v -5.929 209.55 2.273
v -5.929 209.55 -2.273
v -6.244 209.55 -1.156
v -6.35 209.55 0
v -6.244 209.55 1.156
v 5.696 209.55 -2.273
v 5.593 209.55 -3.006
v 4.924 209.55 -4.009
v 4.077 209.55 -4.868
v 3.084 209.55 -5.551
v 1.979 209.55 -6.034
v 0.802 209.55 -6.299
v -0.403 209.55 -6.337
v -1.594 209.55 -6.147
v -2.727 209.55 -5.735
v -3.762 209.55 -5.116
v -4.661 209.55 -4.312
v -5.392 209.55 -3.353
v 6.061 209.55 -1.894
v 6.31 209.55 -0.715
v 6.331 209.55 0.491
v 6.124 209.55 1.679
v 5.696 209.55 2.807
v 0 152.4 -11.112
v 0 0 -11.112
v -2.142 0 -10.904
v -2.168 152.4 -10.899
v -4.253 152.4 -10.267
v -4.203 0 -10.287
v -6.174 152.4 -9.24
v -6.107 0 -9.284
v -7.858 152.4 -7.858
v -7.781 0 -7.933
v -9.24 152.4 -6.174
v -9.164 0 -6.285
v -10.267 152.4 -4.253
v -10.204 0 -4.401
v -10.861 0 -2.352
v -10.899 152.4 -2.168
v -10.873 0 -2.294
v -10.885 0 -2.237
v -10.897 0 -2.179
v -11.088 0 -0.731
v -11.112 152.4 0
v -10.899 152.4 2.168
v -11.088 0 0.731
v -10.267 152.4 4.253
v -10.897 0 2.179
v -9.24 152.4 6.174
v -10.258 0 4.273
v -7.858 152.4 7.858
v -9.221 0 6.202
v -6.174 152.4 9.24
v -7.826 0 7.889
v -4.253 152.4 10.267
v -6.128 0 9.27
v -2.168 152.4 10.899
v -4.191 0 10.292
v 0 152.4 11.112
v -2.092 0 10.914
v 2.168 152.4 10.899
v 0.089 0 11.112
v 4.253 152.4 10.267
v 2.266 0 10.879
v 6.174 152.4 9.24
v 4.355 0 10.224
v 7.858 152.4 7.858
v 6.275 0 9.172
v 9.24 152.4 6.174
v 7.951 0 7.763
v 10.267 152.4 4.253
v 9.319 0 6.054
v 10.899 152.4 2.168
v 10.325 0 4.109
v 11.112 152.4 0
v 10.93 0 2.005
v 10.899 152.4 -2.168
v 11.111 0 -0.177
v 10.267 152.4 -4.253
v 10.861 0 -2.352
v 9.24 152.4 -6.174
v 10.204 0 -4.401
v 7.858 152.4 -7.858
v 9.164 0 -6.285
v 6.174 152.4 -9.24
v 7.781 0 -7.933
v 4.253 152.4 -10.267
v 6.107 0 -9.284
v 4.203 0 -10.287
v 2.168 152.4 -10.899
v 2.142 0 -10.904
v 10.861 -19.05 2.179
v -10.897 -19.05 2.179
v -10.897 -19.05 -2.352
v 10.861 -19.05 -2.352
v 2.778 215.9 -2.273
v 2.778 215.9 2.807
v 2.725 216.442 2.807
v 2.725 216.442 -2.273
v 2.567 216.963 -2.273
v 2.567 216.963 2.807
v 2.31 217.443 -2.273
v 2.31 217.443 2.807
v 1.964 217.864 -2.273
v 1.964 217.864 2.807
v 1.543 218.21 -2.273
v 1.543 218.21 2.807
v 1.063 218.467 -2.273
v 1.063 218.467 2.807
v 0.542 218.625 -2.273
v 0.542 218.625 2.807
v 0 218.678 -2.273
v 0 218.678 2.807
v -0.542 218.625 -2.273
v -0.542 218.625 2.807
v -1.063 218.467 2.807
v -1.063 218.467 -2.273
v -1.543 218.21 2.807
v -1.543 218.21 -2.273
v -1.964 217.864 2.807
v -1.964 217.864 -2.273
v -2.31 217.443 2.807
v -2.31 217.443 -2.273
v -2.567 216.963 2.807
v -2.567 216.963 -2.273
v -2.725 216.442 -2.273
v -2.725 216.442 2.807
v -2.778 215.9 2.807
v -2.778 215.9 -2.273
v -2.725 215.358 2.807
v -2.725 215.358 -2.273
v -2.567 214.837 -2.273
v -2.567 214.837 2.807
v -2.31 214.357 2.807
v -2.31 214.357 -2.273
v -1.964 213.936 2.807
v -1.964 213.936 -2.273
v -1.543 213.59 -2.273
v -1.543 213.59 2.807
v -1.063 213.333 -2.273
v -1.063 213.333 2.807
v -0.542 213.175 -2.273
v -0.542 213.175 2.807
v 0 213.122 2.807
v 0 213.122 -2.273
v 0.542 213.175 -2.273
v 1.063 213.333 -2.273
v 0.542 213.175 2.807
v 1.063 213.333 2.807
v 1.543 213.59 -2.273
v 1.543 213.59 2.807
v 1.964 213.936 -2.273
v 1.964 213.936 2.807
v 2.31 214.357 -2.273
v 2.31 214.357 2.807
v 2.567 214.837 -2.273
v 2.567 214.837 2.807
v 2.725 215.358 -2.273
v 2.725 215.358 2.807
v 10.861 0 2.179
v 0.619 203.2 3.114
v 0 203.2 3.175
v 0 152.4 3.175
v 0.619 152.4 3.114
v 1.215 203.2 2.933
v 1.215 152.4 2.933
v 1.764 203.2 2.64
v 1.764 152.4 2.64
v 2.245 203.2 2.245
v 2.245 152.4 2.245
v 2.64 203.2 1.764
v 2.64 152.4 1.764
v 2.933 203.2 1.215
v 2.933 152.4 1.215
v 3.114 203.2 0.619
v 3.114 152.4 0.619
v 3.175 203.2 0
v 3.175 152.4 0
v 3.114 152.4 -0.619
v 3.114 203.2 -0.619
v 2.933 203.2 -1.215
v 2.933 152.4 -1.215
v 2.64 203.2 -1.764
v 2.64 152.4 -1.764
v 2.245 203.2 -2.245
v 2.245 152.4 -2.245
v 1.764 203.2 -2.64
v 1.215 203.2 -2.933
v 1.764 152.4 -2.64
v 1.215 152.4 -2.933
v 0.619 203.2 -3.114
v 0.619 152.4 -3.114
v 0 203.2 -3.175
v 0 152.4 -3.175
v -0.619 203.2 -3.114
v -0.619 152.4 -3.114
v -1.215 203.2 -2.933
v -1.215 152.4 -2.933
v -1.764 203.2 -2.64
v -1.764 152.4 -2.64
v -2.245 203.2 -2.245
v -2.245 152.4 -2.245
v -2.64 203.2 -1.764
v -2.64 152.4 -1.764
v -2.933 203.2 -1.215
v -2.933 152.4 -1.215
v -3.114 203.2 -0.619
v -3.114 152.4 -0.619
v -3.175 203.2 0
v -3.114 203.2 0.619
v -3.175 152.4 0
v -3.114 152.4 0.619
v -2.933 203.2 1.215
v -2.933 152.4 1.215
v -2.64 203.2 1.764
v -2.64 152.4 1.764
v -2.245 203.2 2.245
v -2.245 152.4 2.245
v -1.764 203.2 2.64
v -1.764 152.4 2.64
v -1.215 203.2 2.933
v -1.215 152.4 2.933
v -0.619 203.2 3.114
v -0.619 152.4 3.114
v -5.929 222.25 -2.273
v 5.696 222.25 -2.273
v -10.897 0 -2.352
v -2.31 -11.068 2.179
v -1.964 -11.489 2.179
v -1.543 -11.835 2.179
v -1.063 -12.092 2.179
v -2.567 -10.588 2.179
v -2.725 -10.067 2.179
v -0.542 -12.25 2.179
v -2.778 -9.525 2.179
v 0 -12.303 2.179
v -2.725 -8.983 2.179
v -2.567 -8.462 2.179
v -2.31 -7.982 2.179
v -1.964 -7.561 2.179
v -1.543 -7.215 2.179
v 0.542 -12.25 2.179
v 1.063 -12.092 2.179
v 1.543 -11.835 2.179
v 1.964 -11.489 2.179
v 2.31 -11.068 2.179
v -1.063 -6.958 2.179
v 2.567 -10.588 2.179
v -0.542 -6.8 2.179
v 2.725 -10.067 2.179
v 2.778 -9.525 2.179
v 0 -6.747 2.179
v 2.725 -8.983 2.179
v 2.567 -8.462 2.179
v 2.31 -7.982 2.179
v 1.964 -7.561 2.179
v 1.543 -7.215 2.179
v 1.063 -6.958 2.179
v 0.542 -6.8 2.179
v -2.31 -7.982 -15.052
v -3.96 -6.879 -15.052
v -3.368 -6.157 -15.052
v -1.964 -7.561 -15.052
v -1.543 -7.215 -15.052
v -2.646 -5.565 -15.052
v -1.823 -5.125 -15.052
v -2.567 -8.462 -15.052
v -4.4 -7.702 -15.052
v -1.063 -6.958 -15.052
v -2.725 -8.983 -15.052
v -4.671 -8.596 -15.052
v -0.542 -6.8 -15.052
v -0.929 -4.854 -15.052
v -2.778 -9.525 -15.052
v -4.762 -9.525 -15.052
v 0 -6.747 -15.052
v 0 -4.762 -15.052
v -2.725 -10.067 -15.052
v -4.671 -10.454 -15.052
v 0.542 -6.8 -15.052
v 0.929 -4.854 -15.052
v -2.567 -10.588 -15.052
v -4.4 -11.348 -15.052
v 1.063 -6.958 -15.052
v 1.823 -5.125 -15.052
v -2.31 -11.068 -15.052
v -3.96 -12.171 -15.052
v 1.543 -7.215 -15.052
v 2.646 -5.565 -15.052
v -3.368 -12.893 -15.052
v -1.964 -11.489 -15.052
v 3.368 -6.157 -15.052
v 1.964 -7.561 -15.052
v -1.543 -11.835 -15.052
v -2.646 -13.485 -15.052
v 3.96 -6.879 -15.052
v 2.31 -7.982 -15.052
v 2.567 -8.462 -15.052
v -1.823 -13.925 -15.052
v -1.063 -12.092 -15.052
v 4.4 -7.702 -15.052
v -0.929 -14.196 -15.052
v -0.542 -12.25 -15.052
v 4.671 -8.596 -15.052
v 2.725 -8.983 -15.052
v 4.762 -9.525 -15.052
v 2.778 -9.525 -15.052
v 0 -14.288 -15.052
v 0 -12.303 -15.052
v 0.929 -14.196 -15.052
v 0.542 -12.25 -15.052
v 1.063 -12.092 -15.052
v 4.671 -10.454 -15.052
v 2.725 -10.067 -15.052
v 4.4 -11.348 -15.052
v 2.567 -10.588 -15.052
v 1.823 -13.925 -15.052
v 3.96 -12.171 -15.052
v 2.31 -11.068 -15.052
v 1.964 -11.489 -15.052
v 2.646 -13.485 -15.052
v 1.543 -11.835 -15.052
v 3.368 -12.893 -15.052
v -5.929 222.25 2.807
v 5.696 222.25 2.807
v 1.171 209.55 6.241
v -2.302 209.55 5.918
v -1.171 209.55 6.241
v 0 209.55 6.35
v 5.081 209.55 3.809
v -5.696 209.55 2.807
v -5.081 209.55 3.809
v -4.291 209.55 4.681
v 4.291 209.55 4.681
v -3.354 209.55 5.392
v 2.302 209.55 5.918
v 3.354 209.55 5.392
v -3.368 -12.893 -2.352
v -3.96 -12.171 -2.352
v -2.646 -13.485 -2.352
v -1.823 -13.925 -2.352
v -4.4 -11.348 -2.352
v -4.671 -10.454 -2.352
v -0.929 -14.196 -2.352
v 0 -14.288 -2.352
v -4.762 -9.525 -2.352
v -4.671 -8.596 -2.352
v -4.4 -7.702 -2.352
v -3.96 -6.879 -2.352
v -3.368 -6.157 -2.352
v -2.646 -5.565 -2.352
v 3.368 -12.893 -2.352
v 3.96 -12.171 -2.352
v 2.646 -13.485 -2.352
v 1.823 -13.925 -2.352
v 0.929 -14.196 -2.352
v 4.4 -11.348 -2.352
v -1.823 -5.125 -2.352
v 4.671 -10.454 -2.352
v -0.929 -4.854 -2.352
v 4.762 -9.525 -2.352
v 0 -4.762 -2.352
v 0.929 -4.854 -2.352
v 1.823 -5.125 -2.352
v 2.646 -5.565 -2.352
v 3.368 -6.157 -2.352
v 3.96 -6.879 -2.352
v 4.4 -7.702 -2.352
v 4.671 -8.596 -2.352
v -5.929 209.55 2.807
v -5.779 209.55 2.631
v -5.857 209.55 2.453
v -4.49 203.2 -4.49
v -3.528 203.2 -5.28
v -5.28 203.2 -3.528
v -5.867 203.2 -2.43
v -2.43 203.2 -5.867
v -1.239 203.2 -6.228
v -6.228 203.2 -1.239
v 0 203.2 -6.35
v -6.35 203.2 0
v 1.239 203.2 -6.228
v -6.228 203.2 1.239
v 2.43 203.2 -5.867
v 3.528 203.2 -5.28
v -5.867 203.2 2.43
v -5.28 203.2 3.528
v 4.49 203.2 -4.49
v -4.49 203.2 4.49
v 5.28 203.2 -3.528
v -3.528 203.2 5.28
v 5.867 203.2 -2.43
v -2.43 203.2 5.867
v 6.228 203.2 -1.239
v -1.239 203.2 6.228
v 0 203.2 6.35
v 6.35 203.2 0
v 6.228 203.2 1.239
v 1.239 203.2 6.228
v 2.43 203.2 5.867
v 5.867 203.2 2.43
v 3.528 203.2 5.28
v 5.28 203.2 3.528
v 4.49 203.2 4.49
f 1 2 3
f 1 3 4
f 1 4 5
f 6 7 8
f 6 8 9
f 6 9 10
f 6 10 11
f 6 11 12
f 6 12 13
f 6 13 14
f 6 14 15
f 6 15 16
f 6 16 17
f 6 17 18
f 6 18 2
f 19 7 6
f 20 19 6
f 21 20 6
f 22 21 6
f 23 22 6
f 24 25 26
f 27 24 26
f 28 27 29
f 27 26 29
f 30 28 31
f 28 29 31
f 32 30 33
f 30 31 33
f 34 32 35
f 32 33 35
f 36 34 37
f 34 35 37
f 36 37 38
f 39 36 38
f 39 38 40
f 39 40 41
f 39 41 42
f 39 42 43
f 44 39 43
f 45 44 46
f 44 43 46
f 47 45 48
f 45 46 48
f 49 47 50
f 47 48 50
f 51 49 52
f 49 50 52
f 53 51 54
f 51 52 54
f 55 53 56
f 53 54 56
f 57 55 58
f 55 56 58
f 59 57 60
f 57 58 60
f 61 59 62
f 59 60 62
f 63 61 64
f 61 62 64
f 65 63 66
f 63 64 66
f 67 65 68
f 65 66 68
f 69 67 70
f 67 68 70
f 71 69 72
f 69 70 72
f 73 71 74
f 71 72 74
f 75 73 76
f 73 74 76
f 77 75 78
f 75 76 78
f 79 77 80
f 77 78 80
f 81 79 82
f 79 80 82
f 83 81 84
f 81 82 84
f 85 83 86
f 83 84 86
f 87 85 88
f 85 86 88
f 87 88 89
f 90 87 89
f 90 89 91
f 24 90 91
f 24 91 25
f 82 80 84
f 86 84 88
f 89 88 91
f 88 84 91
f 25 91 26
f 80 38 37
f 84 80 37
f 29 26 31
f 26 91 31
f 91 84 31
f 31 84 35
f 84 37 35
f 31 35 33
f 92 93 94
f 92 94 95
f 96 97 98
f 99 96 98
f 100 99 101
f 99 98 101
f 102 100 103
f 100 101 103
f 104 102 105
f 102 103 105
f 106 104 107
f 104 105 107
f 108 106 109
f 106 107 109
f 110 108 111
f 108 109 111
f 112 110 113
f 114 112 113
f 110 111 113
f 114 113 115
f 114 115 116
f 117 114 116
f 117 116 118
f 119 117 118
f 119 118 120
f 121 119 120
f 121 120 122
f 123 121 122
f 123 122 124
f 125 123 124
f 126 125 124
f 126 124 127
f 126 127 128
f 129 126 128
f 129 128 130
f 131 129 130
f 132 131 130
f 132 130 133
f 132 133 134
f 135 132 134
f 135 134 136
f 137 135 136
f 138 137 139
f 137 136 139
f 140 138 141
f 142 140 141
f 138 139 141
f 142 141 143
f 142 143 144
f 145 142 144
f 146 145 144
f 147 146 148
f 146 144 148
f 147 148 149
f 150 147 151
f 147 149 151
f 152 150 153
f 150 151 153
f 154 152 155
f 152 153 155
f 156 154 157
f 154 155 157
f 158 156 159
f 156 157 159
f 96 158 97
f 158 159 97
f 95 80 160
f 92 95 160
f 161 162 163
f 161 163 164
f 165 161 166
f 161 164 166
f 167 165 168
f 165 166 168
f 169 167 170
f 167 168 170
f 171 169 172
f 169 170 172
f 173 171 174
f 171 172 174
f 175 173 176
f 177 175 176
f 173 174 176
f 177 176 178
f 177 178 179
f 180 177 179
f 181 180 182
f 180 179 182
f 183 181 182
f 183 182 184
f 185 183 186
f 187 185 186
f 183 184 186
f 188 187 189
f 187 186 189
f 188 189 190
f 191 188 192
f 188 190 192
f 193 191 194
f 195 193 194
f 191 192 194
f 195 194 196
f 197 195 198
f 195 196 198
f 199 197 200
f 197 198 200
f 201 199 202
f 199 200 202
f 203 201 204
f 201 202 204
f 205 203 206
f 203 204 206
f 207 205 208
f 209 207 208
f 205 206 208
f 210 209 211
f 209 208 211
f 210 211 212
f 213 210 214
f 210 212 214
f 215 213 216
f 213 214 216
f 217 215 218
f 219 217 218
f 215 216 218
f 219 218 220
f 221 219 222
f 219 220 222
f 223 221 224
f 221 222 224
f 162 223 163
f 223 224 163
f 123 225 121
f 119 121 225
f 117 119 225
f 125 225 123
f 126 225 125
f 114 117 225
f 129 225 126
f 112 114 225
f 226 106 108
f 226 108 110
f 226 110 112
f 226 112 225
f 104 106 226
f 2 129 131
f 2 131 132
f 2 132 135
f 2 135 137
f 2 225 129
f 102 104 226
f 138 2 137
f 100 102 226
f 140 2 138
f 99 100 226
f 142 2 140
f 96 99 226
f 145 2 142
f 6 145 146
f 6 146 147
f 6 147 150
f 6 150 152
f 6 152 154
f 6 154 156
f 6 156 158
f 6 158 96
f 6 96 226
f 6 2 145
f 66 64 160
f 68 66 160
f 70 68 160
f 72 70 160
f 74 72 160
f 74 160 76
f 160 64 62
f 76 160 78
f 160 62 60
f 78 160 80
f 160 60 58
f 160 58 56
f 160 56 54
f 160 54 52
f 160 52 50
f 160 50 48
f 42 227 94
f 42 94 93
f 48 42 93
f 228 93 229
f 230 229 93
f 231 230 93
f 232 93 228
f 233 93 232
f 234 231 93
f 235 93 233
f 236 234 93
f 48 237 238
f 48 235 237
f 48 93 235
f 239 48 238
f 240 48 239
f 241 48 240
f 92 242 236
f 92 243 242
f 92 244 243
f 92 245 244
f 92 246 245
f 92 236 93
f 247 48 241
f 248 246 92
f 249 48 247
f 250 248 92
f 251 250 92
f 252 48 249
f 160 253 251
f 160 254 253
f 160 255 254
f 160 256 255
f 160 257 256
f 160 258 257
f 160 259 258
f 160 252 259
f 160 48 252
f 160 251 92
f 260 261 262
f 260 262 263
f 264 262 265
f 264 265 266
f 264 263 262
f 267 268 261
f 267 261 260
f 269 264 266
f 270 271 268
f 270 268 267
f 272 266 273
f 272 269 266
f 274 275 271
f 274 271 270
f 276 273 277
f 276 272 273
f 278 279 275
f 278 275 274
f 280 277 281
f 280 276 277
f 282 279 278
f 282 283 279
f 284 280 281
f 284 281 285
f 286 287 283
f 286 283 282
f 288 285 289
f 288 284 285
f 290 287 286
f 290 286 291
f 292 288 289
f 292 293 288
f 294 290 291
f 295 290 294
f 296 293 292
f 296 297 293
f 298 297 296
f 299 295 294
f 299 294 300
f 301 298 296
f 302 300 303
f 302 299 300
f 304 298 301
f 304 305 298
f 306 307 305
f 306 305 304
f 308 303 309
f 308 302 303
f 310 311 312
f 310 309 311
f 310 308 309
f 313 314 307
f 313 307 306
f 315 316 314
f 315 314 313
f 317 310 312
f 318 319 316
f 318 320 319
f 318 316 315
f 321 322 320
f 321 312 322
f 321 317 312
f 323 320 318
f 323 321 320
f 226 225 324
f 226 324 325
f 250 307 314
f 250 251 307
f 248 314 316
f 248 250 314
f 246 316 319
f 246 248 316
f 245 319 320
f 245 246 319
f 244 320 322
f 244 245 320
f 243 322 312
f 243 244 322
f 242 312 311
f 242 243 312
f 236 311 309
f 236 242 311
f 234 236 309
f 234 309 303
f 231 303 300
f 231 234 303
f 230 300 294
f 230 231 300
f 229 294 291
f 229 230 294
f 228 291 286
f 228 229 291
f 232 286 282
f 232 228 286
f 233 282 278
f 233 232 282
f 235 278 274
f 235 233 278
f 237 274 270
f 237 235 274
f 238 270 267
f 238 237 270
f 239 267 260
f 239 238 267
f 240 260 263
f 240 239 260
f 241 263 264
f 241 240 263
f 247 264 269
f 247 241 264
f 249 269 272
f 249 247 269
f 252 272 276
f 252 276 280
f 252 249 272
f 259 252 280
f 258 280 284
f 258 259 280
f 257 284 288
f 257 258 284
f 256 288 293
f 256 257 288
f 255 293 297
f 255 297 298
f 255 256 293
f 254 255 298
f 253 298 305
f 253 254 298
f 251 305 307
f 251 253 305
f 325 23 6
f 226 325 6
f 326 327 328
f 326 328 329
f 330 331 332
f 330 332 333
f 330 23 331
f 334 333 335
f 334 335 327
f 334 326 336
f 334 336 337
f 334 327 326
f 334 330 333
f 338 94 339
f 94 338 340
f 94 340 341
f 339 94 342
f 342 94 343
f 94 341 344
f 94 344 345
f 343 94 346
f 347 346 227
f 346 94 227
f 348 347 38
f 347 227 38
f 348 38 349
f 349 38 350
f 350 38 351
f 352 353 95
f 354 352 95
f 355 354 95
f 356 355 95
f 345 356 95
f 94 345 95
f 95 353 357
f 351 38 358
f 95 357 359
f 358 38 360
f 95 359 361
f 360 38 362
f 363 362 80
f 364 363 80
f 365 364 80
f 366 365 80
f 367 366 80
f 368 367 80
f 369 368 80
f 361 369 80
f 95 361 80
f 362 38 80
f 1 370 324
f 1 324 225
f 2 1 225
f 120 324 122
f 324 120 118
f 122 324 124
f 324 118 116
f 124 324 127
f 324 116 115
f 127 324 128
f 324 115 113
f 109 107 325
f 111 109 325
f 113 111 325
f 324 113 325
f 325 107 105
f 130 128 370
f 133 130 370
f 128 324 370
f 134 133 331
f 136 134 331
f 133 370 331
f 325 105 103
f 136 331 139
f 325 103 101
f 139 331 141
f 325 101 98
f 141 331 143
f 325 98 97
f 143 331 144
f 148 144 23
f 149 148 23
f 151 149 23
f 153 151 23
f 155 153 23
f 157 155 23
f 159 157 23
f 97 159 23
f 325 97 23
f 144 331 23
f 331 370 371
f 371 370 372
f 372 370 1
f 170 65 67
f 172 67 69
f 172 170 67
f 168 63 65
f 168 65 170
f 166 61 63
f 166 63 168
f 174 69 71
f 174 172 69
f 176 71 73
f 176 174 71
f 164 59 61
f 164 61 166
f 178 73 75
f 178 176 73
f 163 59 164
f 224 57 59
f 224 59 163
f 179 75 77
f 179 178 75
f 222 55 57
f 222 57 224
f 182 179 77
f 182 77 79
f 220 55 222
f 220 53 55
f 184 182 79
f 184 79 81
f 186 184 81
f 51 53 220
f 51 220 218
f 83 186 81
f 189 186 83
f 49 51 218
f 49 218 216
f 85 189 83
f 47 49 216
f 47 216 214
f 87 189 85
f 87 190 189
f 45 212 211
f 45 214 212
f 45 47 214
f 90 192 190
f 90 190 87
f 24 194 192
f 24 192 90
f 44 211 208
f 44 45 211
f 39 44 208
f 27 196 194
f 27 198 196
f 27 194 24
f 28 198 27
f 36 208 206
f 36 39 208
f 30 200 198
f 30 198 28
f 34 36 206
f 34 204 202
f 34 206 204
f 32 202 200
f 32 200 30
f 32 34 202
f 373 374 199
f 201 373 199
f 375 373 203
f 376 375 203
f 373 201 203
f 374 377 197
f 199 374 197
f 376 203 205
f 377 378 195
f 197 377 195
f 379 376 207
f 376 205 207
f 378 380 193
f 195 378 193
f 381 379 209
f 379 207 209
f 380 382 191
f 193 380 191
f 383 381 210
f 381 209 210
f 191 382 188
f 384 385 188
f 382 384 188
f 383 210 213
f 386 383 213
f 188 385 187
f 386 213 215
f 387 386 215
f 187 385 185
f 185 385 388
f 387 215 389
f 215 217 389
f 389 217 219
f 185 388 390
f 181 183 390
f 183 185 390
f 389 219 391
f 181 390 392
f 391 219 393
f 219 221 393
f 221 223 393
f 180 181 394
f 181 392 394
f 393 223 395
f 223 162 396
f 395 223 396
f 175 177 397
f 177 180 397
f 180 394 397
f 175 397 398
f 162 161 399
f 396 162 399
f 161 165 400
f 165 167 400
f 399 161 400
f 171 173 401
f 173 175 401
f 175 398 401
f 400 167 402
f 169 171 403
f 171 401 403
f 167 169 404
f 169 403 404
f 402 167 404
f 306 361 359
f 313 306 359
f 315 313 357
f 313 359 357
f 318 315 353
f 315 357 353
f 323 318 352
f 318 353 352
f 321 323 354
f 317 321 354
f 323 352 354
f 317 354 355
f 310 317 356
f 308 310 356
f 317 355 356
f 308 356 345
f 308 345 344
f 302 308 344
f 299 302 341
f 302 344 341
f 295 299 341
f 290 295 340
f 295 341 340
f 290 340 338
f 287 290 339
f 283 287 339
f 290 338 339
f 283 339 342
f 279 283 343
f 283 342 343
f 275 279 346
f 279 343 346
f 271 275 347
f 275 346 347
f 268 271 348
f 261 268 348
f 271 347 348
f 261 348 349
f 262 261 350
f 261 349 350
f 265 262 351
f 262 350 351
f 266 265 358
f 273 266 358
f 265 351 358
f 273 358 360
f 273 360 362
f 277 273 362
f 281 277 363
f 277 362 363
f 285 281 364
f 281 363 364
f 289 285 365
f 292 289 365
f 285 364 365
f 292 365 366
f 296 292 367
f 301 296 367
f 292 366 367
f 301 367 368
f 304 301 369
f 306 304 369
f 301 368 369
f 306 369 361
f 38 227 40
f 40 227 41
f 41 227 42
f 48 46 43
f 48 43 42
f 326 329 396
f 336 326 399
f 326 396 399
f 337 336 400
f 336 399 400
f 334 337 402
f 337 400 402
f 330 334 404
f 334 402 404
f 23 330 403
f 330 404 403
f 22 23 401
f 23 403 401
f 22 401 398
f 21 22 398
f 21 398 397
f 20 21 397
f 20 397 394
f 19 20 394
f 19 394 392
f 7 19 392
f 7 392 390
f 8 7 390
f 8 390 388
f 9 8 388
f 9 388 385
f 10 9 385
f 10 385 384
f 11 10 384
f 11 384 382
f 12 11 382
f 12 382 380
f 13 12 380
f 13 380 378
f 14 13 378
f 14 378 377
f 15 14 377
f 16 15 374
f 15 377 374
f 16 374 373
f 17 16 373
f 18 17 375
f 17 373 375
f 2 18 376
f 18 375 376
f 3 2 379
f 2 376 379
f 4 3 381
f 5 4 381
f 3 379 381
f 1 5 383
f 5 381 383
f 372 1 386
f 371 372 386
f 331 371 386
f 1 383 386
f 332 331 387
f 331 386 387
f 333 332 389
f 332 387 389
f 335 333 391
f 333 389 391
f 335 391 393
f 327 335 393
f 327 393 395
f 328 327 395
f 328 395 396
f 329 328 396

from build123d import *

# Parameters (mm, degrees)
SKETCH1_R           = 11.1125
BOSS_EXTRUDE1_DEPTH = 152.4
SKETCH2_R           = 3.175
BOSS_EXTRUDE2_DEPTH = 50.8
SKETCH3_W           = 21.757515496
SKETCH3_H           = 4.530998995
BOSS_EXTRUDE3_DEPTH = 19.05
SKETCH4_R           = 2.778125
CUT_EXTRUDE1_DEPTH  = 19.05
SKETCH5_R           = 4.7625
SKETCH5_R_2         = 2.778125
BOSS_EXTRUDE4_DEPTH = 12.7
SKETCH6_R           = 6.35
BOSS_EXTRUDE5_DEPTH = 6.35
SKETCH7_W           = 11.625186508
SKETCH7_H           = 5.08
BOSS_EXTRUDE6_DEPTH = 12.7
SKETCH8_R           = 2.778125
CUT_EXTRUDE2_DEPTH  = 12.7


with BuildPart() as part:
    # Sketch1 → Boss-Extrude1 (new body)
    with BuildSketch(Plane(origin=(0, 0, 0), x_dir=(1, 0, 0), z_dir=(0, 1, 0))):
        with Locations(Location((0, 0, 0), (0, 0, 90))):
            Circle(SKETCH1_R)
    extrude(amount=BOSS_EXTRUDE1_DEPTH)

    # Sketch2 → Boss-Extrude2 (add)
    with BuildSketch(Plane(origin=(0, 152.4, 0), x_dir=(1, 0, 0), z_dir=(0, 1, 0))):
        with Locations(Location((0, 0, 0), (0, 0, 270))):
            Circle(SKETCH2_R)
    extrude(amount=BOSS_EXTRUDE2_DEPTH)

    # Sketch3 → Boss-Extrude3 (add)
    with BuildSketch(Plane.XZ):
        with Locations((-0.018003691, -0.086452367)):
            Rectangle(SKETCH3_W, SKETCH3_H)
    extrude(amount=BOSS_EXTRUDE3_DEPTH)

    # Sketch4 → Cut-Extrude1 (cut)
    with BuildSketch(Plane.XY.offset(2.179047131)):
        with Locations((0, -9.525)):
            Circle(SKETCH4_R)
    extrude(amount=-CUT_EXTRUDE1_DEPTH, mode=Mode.SUBTRACT)

    # Sketch5 → Boss-Extrude4 (add)
    with BuildSketch(Plane(origin=(0, 0, -2.351951864), x_dir=(-1, 0, 0), z_dir=(0, 0, -1))):
        with Locations(Location((0, -9.525, 0), (0, 0, 180))):
            Circle(SKETCH5_R)
        with Locations(Location((0, -9.525, 0), (0, 0, 180))):
            Circle(SKETCH5_R_2, mode=Mode.SUBTRACT)
    extrude(amount=BOSS_EXTRUDE4_DEPTH)

    # Sketch6 → Boss-Extrude5 (add)
    with BuildSketch(Plane(origin=(0, 203.2, 0), x_dir=(1, 0, 0), z_dir=(0, 1, 0))):
        with Locations(Location((0, 0, 0), (0, 0, 270))):
            Circle(SKETCH6_R)
    extrude(amount=BOSS_EXTRUDE5_DEPTH)

    # Sketch7 → Boss-Extrude6 (add)
    with BuildSketch(Plane(origin=(0, 209.55, 0), x_dir=(1, 0, 0), z_dir=(0, 1, 0))):
        with Locations((-0.116507708, -0.266618865)):
            Rectangle(SKETCH7_W, SKETCH7_H)
    extrude(amount=BOSS_EXTRUDE6_DEPTH)

    # Sketch8 → Cut-Extrude2 (cut)
    with BuildSketch(Plane.XY.offset(2.806618865)):
        with Locations((0, 215.9)):
            Circle(SKETCH8_R)
    extrude(amount=-CUT_EXTRUDE2_DEPTH, mode=Mode.SUBTRACT)


solid = part.part
